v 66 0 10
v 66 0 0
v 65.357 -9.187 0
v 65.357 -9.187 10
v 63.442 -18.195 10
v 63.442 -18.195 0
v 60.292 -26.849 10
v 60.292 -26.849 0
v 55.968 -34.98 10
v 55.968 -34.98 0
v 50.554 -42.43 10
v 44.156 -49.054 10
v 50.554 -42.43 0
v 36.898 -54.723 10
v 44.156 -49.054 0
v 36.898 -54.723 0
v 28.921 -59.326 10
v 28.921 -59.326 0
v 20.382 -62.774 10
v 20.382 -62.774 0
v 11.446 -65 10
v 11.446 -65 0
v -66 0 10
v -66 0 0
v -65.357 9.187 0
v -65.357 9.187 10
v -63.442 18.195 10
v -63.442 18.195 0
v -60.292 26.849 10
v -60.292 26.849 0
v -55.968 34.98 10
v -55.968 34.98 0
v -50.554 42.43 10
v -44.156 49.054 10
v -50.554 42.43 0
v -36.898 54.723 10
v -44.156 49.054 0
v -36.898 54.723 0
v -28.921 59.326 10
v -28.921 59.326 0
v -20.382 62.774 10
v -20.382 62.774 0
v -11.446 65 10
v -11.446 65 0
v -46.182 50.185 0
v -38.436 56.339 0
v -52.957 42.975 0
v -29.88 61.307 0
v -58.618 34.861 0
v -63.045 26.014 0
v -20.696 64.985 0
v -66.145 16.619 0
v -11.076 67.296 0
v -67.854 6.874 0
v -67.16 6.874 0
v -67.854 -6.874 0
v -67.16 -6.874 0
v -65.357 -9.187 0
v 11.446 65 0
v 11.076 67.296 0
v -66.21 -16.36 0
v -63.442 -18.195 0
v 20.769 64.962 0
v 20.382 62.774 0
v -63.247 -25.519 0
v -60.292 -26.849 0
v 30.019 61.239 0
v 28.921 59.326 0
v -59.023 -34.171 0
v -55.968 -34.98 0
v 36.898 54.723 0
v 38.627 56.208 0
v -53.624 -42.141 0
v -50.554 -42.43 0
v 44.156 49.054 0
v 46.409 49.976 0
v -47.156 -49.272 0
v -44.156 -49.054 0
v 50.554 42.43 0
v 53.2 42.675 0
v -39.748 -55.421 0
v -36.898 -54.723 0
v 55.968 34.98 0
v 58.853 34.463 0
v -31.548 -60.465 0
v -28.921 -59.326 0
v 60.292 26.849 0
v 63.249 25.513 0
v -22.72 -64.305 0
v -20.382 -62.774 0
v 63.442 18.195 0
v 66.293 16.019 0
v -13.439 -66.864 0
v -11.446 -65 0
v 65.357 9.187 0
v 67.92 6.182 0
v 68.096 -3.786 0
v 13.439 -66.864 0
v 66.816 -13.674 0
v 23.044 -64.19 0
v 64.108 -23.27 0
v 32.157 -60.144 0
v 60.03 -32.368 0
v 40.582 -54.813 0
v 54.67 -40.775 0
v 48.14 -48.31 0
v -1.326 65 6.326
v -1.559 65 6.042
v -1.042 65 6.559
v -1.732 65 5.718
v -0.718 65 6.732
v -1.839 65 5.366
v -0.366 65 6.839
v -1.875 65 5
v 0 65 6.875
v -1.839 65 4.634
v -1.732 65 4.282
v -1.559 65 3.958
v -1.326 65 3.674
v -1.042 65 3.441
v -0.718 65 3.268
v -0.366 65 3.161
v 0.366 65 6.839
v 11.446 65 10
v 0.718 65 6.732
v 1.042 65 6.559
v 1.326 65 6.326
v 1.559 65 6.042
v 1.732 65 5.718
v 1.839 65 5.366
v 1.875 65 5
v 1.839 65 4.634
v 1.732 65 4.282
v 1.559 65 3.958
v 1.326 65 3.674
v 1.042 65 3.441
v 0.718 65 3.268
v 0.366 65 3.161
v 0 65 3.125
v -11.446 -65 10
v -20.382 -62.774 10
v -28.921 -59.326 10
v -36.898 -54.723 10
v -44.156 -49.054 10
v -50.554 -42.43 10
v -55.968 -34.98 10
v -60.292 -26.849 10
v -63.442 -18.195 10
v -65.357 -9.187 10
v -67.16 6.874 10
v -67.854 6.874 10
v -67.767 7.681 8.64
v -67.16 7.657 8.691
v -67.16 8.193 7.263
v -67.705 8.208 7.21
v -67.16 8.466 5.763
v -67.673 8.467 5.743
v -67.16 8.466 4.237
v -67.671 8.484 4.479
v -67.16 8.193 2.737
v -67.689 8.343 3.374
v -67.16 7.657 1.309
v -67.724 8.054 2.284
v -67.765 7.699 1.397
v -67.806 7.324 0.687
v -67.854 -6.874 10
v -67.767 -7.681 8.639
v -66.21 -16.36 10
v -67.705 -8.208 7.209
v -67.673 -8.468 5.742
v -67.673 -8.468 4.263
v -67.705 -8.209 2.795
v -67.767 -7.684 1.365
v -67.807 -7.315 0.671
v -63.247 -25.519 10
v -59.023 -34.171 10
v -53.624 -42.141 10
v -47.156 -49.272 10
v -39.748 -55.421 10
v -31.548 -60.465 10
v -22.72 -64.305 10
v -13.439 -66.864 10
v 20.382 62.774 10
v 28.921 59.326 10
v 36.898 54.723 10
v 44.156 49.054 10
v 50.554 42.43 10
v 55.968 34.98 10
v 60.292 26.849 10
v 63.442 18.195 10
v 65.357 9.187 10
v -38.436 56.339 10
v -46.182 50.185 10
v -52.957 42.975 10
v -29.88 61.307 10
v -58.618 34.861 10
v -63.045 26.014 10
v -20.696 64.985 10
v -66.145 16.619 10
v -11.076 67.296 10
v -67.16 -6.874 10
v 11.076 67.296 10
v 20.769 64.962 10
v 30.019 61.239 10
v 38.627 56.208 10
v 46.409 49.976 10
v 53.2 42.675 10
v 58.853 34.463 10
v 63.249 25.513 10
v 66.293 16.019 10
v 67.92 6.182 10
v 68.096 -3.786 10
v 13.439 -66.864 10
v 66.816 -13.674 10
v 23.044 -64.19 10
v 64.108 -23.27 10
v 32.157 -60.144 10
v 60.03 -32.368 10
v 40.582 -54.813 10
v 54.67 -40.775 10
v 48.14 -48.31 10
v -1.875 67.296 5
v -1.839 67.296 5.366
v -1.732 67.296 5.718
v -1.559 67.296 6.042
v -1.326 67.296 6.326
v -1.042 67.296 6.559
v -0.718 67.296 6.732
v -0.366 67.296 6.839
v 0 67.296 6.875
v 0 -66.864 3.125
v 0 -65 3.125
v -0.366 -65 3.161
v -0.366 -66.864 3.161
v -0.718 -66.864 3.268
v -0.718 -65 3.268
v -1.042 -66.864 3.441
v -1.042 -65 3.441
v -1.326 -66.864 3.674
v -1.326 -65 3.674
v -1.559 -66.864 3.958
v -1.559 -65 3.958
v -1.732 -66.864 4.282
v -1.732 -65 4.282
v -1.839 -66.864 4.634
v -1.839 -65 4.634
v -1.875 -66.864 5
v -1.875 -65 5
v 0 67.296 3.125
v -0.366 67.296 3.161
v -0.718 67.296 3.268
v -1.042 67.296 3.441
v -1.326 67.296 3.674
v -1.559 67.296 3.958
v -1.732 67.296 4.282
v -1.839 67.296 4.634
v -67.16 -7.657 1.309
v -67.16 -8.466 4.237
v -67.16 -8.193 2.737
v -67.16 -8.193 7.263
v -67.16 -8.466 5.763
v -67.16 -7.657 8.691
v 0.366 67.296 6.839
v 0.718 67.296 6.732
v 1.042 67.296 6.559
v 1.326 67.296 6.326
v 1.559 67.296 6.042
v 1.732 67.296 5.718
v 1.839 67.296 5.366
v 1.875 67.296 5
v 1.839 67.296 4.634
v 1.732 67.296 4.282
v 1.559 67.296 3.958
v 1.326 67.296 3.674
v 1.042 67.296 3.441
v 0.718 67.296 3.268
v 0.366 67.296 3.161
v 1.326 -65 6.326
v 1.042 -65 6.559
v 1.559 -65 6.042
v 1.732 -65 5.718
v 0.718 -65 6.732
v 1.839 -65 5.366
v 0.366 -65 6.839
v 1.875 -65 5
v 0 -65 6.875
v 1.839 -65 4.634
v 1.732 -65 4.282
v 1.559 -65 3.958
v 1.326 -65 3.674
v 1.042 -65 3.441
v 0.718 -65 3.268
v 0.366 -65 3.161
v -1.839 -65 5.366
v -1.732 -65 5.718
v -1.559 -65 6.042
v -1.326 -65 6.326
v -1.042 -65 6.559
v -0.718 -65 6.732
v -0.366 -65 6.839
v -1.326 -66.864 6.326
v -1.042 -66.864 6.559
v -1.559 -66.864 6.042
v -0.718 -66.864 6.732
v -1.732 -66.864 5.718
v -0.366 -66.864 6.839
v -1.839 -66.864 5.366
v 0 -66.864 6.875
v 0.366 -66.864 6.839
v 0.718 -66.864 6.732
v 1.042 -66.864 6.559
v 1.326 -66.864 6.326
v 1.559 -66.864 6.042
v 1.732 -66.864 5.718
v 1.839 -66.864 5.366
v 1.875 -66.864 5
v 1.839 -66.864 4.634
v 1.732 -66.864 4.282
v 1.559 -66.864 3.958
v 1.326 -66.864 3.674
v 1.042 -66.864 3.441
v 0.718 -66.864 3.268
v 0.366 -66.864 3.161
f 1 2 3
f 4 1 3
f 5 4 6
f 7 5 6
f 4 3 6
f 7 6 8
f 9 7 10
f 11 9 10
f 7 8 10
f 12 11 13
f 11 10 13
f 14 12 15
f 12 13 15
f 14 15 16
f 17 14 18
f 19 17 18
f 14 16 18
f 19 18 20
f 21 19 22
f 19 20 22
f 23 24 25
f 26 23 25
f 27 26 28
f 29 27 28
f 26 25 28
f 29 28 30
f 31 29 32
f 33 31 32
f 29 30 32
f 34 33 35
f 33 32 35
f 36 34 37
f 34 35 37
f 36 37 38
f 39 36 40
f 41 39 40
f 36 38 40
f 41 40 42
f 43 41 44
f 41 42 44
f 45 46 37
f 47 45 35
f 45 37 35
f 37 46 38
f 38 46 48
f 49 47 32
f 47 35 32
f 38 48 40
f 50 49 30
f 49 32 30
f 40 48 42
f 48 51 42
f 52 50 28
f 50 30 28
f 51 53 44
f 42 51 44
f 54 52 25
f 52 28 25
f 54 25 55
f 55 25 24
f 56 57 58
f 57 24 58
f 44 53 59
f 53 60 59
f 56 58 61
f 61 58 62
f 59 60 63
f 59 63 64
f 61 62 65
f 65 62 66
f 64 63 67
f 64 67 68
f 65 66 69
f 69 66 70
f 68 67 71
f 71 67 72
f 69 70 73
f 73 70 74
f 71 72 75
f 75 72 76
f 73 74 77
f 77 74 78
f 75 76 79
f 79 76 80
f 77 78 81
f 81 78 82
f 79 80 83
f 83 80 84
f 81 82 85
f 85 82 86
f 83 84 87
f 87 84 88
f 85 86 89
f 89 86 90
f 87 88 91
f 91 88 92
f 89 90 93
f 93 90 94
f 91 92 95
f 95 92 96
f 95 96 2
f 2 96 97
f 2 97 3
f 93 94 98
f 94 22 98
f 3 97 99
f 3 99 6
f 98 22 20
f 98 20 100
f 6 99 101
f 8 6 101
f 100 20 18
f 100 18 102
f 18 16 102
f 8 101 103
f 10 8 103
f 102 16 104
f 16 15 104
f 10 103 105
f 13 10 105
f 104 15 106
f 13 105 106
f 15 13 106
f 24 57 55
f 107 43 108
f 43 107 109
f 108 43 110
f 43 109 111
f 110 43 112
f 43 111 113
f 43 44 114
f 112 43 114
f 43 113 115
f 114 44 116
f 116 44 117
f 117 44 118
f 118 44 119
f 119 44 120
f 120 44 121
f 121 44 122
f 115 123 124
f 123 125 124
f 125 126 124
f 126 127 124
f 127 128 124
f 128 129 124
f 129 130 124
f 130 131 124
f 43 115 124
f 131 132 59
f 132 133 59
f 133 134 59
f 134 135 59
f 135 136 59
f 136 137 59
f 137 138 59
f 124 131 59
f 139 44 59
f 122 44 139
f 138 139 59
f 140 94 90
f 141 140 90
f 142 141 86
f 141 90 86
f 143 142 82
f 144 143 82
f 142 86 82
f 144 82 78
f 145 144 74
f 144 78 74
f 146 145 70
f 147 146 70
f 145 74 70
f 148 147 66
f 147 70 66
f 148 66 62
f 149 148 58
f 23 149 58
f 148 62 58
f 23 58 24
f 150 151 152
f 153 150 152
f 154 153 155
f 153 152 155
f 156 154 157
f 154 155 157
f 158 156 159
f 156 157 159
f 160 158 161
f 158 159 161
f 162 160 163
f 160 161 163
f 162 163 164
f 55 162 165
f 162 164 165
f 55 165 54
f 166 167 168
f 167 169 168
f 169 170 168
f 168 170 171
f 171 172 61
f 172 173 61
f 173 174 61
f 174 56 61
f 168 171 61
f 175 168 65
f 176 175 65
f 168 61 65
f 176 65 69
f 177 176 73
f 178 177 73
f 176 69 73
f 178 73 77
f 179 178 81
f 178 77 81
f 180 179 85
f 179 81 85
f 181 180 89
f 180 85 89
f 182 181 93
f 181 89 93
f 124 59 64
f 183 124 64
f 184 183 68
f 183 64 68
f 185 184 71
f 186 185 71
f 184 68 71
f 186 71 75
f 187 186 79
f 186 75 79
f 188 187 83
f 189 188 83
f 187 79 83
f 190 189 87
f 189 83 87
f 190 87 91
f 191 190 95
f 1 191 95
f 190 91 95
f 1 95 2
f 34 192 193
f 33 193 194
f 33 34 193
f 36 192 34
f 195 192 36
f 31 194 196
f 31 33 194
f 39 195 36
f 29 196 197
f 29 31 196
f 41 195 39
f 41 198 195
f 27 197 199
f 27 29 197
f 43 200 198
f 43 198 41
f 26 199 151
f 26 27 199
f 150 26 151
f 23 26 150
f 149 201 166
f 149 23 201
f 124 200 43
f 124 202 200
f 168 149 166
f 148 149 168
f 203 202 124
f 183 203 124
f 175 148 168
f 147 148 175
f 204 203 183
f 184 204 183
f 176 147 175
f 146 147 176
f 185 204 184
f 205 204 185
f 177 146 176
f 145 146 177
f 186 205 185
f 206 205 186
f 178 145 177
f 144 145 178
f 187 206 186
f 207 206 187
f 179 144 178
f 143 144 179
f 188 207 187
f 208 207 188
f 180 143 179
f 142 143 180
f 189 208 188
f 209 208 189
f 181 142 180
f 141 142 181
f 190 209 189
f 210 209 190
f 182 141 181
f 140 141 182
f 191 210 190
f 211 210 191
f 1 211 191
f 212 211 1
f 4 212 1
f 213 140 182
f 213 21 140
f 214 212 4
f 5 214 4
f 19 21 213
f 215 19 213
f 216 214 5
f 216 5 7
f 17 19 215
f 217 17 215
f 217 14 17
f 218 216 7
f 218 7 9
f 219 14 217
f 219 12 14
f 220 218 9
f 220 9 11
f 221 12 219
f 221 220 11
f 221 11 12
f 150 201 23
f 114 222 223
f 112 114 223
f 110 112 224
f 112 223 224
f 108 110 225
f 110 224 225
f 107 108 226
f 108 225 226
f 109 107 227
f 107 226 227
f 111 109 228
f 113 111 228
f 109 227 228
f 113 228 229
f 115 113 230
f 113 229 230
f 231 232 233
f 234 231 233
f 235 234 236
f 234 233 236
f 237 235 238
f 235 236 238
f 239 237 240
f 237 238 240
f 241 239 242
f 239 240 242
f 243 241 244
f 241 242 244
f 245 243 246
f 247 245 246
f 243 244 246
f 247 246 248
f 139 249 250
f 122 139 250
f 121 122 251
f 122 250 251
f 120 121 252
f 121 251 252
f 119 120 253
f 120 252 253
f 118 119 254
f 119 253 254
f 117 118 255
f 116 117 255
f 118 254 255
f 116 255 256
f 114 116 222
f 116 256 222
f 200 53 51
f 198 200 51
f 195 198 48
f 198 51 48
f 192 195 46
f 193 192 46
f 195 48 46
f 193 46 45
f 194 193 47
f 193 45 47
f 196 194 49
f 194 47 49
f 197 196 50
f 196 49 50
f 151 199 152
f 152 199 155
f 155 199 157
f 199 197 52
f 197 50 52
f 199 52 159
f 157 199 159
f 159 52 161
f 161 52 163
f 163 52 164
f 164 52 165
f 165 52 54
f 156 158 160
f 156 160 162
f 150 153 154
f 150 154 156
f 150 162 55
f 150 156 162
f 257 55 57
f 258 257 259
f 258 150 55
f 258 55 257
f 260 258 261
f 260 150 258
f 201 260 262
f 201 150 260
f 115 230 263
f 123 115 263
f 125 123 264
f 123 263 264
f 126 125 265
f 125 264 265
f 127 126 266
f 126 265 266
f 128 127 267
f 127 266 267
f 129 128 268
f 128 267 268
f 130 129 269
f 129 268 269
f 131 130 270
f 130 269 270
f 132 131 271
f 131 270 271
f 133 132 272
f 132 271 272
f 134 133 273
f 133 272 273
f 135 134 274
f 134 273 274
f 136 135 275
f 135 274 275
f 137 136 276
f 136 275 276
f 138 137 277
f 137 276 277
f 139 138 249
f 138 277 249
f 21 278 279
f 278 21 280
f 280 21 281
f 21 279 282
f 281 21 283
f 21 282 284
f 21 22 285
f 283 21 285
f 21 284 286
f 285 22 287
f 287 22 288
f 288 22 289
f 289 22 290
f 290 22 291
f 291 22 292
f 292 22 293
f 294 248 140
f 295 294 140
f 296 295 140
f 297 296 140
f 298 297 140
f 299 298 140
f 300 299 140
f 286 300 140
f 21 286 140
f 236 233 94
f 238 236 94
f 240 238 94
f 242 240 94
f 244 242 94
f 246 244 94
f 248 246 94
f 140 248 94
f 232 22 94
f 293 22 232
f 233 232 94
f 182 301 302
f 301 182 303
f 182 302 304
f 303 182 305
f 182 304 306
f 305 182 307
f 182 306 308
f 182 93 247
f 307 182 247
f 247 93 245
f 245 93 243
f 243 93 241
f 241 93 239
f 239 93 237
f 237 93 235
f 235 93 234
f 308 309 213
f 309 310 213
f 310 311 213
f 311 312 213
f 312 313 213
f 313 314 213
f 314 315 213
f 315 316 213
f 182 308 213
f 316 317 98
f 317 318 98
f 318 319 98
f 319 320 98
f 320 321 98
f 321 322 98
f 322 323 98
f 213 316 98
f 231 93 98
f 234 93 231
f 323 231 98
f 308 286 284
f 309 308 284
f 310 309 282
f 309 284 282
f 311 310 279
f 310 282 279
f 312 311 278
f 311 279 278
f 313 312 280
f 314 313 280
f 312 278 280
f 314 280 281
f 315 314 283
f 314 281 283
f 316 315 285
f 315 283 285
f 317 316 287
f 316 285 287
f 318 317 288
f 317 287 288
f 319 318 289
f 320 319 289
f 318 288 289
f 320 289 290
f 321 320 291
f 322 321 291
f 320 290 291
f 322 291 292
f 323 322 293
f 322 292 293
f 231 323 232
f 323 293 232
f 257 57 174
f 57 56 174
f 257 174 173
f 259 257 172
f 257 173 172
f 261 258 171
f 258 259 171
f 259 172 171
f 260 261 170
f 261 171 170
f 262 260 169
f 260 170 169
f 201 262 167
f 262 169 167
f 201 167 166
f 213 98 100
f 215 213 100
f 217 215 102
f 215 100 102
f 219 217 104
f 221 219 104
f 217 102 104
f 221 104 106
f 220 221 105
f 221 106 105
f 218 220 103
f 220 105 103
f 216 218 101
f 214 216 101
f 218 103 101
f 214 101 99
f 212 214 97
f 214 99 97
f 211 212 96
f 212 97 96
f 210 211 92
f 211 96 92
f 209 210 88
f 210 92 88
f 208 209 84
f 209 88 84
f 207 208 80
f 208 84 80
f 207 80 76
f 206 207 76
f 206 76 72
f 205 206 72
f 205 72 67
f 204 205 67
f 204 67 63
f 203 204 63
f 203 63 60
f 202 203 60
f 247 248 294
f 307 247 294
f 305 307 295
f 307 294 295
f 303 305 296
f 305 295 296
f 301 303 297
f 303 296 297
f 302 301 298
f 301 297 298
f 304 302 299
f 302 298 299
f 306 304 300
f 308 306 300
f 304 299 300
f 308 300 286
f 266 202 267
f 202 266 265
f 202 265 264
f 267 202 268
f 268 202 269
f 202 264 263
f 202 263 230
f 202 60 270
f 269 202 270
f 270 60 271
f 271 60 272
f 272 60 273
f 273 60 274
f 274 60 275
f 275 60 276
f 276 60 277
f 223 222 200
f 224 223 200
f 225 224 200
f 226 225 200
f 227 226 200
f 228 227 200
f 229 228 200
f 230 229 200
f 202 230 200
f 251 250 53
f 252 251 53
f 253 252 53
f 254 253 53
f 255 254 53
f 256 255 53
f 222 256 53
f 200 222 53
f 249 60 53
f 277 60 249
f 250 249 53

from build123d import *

# Parameters (mm, degrees)
F1_DEPTH = 10
F3_DEPTH = 170
F4_W     = 4.053228
F4_H     = 4.812476
F5_DEPTH = 25
F6_W     = 4.812476
F6_H     = 10
F7_DEPTH = 1.55
F8_R     = 8.5
F9_DEPTH = 1


with BuildPart() as f1:
    # F0 (on Top) → F1 (new body)
    with BuildSketch(Plane.XY):
        with BuildLine():
            Line((0, -66.863723), (13.439171, -66.863723))
            ThreePointArc((13.439171, -66.863723), (68.190366, 1.201156), (11.07599, 67.295551))
            Line((11.07599, 67.295551), (0, 67.295551))
            Line((0, 67.295551), (-11.07599, 67.295551))
            ThreePointArc((-11.07599, 67.295551), (-68.190366, 1.201156), (-13.439171, -66.863723))
            Line((-13.439171, -66.863723), (0, -66.863723))
        make_face()
        with BuildLine():
            Line((-11.445523, 65), (0, 65))
            Line((0, 65), (11.445523, 65))
            ThreePointArc((11.445523, 65), (50.553954, 42.429916), (66, 0))
            ThreePointArc((66, 0), (50.553954, -42.429916), (11.445523, -65))
            Line((11.445523, -65), (0, -65))
            Line((0, -65), (-11.445523, -65))
            ThreePointArc((-11.445523, -65), (-50.553954, -42.429916), (-66, 0))
            ThreePointArc((-66, 0), (-50.553954, 42.429916), (-11.445523, 65))
        make_face(mode=Mode.SUBTRACT)
    extrude(amount=F1_DEPTH)

    # F2 (on face) → F3 (cut)
    with BuildSketch(Plane(origin=(0, 67.295551, 0), x_dir=(-1, 0, 0), z_dir=(0, 1, 0))):
        with BuildLine():
            ThreePointArc((0, 6.875), (-1.875, 5), (0, 3.125))
            Line((0, 3.125), (0, 6.875))
        make_face()
        with BuildLine():
            Line((0, 6.875), (0, 3.125))
            ThreePointArc((0, 3.125), (1.325825, 3.674175), (1.875, 5))
            ThreePointArc((1.875, 5), (1.325825, 6.325825), (0, 6.875))
        make_face()
    extrude(amount=-F3_DEPTH, mode=Mode.SUBTRACT)

    # F4 (on face) → F5 (cut)
    with BuildSketch(Plane.XY.offset(10)):
        with Locations((-68.636846, 0)):
            Rectangle(F4_W, F4_H)
    extrude(amount=-F5_DEPTH, mode=Mode.SUBTRACT)

    # F6 (on face) → F7 (join)
    with BuildSketch(Plane(origin=(-66.610232, 0, 0), x_dir=(0, -1, 0), z_dir=(-1, 0, 0))):
        with Locations((0, 5)):
            Rectangle(F6_W, F6_H)
    extrude(amount=F7_DEPTH)

    # F8 (on face) → F9 (cut)
    with BuildSketch(Plane(origin=(-68.160232, 0, 0), x_dir=(0, -1, 0), z_dir=(-1, 0, 0))):
        with Locations((0, 5)):
            Circle(F8_R)
    extrude(amount=-F9_DEPTH, mode=Mode.SUBTRACT)


solid = f1.part
